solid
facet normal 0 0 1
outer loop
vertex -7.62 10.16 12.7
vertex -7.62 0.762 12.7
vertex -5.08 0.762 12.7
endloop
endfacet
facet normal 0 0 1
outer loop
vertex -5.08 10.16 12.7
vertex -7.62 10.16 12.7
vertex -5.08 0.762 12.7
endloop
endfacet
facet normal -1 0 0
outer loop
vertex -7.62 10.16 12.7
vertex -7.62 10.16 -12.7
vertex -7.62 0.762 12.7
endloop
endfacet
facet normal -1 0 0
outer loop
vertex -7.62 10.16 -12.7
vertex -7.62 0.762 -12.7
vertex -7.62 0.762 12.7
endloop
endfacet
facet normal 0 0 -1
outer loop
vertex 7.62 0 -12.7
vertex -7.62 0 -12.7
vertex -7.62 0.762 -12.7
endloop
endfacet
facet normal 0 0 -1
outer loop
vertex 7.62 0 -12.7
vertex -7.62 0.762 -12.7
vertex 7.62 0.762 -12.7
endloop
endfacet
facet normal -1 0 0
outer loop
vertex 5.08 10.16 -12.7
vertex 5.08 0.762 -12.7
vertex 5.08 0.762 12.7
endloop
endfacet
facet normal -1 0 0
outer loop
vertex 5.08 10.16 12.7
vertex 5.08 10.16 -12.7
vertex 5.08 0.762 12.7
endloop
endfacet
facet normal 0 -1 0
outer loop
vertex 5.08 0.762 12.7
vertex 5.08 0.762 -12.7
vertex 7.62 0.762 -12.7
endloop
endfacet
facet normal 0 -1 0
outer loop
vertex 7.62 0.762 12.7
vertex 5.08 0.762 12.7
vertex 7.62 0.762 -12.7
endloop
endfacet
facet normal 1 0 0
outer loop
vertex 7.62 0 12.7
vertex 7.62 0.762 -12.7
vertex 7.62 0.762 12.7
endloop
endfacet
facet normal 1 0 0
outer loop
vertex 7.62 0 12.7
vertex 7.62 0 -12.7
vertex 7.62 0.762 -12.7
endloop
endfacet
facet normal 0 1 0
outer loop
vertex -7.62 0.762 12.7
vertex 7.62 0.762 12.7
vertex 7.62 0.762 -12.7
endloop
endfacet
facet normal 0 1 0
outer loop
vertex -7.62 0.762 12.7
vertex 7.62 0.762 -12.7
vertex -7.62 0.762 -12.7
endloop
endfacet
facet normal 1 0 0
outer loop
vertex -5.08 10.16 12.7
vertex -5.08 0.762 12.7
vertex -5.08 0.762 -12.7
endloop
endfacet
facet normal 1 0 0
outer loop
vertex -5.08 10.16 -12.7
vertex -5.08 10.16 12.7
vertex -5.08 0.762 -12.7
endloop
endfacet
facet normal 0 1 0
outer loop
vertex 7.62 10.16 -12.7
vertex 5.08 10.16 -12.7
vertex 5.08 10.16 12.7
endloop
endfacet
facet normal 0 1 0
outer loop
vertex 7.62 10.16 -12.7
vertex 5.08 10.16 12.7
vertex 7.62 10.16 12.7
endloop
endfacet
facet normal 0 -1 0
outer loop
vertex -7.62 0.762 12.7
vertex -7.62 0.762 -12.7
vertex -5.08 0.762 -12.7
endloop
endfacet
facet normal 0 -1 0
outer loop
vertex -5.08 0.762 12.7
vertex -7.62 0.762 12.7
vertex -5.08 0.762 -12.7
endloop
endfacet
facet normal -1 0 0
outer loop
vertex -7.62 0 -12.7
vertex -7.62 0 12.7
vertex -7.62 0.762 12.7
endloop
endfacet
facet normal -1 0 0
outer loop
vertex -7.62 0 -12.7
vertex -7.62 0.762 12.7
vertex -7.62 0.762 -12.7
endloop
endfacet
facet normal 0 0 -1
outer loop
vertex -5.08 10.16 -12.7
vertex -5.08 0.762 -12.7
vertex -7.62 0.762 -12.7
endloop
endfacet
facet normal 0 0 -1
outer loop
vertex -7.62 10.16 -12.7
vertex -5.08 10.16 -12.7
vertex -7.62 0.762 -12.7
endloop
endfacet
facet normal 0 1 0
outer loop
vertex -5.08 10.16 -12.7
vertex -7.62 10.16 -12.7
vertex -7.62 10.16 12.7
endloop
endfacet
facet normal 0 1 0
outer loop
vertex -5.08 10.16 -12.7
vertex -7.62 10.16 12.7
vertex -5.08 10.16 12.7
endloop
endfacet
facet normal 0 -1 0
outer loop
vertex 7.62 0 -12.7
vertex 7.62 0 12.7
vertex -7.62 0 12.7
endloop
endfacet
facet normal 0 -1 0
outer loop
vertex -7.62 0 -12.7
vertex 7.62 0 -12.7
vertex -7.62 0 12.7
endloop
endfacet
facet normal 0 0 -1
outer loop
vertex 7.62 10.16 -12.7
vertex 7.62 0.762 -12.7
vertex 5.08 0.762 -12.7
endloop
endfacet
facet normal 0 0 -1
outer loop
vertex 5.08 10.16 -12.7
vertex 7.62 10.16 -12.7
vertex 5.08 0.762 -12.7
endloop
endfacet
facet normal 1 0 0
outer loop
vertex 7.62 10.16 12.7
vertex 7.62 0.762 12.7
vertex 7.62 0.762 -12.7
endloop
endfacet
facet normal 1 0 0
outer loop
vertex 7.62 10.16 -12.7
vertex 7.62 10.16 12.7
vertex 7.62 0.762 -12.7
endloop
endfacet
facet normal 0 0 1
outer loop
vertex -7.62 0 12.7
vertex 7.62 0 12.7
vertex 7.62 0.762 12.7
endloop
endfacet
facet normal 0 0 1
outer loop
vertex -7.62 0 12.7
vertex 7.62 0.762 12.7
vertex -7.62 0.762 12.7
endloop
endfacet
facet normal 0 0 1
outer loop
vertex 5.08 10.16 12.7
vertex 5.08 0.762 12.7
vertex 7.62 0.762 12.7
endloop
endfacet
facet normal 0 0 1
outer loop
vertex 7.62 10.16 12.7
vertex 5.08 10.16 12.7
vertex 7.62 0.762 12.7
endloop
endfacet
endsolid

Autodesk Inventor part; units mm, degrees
ref_plane "YZ Plane" through (0, 0, 0) normal (1, 0, 0) x (0, 1, 0)
ref_plane "XZ Plane" through (0, 0, 0) normal (0, 1, 0) x (-1, 0, 0)
ref_plane "XY Plane" through (0, 0, 0) normal (0, 0, 1) x (1, 0, 0)
sketch "Sketch1" plane through (0, 0, 0) normal (0, 1, 0) x (-1, 0, 0)
  line L0 (-7.62, 12.7) -> (7.62, 12.7)
  line L1 (7.62, 12.7) -> (7.62, -12.7)
  line L2 (7.62, -12.7) -> (-7.62, -12.7)
  line L3 (-7.62, -12.7) -> (-7.62, 12.7)
  line L4 (-7.62, 12.7) -> (7.62, -12.7) construction
  line L5 (7.62, 12.7) -> (-7.62, -12.7) construction
  point P0 (0, 0)
  dimension "d0" = 15.24
  dimension "d1" = 25.4
extrude "Extrusion1" add sketch "Sketch1" along normal blind 0.762
sketch "Sketch3" plane through (0, 0.762, 0) normal (0, 1, 0) x (1, 0, 0)
  line L0 (7.62, 12.7) -> (-7.62, 12.7) projected
  line L1 (-7.62, 12.7) -> (-7.62, -12.7) projected
  line L2 (-7.62, -12.7) -> (7.62, -12.7) projected
  line L3 (7.62, -12.7) -> (7.62, 12.7) projected
  line L4 (-7.62, -12.7) -> (-5.08, -12.7)
  line L5 (-5.08, -12.7) -> (-5.08, 12.7)
  line L6 (-5.08, 12.7) -> (-7.62, 12.7)
  line L7 (-7.62, 12.7) -> (-7.62, -12.7)
  line L8 (7.62, 12.7) -> (5.08, 12.7)
  line L9 (5.08, 12.7) -> (5.08, -12.7)
  line L10 (5.08, -12.7) -> (7.62, -12.7)
  line L11 (7.62, -12.7) -> (7.62, 12.7)
  point P0 (0, 0)
  dimension "d7" = 2.54
  dimension "d8" = 2.54
extrude "Extrusion3" add sketch "Sketch3" along normal blind 9.398 separate body contours L3 L2 L9 L0 | L5 L2 L1 L0
properties part number "voltageconverter"
